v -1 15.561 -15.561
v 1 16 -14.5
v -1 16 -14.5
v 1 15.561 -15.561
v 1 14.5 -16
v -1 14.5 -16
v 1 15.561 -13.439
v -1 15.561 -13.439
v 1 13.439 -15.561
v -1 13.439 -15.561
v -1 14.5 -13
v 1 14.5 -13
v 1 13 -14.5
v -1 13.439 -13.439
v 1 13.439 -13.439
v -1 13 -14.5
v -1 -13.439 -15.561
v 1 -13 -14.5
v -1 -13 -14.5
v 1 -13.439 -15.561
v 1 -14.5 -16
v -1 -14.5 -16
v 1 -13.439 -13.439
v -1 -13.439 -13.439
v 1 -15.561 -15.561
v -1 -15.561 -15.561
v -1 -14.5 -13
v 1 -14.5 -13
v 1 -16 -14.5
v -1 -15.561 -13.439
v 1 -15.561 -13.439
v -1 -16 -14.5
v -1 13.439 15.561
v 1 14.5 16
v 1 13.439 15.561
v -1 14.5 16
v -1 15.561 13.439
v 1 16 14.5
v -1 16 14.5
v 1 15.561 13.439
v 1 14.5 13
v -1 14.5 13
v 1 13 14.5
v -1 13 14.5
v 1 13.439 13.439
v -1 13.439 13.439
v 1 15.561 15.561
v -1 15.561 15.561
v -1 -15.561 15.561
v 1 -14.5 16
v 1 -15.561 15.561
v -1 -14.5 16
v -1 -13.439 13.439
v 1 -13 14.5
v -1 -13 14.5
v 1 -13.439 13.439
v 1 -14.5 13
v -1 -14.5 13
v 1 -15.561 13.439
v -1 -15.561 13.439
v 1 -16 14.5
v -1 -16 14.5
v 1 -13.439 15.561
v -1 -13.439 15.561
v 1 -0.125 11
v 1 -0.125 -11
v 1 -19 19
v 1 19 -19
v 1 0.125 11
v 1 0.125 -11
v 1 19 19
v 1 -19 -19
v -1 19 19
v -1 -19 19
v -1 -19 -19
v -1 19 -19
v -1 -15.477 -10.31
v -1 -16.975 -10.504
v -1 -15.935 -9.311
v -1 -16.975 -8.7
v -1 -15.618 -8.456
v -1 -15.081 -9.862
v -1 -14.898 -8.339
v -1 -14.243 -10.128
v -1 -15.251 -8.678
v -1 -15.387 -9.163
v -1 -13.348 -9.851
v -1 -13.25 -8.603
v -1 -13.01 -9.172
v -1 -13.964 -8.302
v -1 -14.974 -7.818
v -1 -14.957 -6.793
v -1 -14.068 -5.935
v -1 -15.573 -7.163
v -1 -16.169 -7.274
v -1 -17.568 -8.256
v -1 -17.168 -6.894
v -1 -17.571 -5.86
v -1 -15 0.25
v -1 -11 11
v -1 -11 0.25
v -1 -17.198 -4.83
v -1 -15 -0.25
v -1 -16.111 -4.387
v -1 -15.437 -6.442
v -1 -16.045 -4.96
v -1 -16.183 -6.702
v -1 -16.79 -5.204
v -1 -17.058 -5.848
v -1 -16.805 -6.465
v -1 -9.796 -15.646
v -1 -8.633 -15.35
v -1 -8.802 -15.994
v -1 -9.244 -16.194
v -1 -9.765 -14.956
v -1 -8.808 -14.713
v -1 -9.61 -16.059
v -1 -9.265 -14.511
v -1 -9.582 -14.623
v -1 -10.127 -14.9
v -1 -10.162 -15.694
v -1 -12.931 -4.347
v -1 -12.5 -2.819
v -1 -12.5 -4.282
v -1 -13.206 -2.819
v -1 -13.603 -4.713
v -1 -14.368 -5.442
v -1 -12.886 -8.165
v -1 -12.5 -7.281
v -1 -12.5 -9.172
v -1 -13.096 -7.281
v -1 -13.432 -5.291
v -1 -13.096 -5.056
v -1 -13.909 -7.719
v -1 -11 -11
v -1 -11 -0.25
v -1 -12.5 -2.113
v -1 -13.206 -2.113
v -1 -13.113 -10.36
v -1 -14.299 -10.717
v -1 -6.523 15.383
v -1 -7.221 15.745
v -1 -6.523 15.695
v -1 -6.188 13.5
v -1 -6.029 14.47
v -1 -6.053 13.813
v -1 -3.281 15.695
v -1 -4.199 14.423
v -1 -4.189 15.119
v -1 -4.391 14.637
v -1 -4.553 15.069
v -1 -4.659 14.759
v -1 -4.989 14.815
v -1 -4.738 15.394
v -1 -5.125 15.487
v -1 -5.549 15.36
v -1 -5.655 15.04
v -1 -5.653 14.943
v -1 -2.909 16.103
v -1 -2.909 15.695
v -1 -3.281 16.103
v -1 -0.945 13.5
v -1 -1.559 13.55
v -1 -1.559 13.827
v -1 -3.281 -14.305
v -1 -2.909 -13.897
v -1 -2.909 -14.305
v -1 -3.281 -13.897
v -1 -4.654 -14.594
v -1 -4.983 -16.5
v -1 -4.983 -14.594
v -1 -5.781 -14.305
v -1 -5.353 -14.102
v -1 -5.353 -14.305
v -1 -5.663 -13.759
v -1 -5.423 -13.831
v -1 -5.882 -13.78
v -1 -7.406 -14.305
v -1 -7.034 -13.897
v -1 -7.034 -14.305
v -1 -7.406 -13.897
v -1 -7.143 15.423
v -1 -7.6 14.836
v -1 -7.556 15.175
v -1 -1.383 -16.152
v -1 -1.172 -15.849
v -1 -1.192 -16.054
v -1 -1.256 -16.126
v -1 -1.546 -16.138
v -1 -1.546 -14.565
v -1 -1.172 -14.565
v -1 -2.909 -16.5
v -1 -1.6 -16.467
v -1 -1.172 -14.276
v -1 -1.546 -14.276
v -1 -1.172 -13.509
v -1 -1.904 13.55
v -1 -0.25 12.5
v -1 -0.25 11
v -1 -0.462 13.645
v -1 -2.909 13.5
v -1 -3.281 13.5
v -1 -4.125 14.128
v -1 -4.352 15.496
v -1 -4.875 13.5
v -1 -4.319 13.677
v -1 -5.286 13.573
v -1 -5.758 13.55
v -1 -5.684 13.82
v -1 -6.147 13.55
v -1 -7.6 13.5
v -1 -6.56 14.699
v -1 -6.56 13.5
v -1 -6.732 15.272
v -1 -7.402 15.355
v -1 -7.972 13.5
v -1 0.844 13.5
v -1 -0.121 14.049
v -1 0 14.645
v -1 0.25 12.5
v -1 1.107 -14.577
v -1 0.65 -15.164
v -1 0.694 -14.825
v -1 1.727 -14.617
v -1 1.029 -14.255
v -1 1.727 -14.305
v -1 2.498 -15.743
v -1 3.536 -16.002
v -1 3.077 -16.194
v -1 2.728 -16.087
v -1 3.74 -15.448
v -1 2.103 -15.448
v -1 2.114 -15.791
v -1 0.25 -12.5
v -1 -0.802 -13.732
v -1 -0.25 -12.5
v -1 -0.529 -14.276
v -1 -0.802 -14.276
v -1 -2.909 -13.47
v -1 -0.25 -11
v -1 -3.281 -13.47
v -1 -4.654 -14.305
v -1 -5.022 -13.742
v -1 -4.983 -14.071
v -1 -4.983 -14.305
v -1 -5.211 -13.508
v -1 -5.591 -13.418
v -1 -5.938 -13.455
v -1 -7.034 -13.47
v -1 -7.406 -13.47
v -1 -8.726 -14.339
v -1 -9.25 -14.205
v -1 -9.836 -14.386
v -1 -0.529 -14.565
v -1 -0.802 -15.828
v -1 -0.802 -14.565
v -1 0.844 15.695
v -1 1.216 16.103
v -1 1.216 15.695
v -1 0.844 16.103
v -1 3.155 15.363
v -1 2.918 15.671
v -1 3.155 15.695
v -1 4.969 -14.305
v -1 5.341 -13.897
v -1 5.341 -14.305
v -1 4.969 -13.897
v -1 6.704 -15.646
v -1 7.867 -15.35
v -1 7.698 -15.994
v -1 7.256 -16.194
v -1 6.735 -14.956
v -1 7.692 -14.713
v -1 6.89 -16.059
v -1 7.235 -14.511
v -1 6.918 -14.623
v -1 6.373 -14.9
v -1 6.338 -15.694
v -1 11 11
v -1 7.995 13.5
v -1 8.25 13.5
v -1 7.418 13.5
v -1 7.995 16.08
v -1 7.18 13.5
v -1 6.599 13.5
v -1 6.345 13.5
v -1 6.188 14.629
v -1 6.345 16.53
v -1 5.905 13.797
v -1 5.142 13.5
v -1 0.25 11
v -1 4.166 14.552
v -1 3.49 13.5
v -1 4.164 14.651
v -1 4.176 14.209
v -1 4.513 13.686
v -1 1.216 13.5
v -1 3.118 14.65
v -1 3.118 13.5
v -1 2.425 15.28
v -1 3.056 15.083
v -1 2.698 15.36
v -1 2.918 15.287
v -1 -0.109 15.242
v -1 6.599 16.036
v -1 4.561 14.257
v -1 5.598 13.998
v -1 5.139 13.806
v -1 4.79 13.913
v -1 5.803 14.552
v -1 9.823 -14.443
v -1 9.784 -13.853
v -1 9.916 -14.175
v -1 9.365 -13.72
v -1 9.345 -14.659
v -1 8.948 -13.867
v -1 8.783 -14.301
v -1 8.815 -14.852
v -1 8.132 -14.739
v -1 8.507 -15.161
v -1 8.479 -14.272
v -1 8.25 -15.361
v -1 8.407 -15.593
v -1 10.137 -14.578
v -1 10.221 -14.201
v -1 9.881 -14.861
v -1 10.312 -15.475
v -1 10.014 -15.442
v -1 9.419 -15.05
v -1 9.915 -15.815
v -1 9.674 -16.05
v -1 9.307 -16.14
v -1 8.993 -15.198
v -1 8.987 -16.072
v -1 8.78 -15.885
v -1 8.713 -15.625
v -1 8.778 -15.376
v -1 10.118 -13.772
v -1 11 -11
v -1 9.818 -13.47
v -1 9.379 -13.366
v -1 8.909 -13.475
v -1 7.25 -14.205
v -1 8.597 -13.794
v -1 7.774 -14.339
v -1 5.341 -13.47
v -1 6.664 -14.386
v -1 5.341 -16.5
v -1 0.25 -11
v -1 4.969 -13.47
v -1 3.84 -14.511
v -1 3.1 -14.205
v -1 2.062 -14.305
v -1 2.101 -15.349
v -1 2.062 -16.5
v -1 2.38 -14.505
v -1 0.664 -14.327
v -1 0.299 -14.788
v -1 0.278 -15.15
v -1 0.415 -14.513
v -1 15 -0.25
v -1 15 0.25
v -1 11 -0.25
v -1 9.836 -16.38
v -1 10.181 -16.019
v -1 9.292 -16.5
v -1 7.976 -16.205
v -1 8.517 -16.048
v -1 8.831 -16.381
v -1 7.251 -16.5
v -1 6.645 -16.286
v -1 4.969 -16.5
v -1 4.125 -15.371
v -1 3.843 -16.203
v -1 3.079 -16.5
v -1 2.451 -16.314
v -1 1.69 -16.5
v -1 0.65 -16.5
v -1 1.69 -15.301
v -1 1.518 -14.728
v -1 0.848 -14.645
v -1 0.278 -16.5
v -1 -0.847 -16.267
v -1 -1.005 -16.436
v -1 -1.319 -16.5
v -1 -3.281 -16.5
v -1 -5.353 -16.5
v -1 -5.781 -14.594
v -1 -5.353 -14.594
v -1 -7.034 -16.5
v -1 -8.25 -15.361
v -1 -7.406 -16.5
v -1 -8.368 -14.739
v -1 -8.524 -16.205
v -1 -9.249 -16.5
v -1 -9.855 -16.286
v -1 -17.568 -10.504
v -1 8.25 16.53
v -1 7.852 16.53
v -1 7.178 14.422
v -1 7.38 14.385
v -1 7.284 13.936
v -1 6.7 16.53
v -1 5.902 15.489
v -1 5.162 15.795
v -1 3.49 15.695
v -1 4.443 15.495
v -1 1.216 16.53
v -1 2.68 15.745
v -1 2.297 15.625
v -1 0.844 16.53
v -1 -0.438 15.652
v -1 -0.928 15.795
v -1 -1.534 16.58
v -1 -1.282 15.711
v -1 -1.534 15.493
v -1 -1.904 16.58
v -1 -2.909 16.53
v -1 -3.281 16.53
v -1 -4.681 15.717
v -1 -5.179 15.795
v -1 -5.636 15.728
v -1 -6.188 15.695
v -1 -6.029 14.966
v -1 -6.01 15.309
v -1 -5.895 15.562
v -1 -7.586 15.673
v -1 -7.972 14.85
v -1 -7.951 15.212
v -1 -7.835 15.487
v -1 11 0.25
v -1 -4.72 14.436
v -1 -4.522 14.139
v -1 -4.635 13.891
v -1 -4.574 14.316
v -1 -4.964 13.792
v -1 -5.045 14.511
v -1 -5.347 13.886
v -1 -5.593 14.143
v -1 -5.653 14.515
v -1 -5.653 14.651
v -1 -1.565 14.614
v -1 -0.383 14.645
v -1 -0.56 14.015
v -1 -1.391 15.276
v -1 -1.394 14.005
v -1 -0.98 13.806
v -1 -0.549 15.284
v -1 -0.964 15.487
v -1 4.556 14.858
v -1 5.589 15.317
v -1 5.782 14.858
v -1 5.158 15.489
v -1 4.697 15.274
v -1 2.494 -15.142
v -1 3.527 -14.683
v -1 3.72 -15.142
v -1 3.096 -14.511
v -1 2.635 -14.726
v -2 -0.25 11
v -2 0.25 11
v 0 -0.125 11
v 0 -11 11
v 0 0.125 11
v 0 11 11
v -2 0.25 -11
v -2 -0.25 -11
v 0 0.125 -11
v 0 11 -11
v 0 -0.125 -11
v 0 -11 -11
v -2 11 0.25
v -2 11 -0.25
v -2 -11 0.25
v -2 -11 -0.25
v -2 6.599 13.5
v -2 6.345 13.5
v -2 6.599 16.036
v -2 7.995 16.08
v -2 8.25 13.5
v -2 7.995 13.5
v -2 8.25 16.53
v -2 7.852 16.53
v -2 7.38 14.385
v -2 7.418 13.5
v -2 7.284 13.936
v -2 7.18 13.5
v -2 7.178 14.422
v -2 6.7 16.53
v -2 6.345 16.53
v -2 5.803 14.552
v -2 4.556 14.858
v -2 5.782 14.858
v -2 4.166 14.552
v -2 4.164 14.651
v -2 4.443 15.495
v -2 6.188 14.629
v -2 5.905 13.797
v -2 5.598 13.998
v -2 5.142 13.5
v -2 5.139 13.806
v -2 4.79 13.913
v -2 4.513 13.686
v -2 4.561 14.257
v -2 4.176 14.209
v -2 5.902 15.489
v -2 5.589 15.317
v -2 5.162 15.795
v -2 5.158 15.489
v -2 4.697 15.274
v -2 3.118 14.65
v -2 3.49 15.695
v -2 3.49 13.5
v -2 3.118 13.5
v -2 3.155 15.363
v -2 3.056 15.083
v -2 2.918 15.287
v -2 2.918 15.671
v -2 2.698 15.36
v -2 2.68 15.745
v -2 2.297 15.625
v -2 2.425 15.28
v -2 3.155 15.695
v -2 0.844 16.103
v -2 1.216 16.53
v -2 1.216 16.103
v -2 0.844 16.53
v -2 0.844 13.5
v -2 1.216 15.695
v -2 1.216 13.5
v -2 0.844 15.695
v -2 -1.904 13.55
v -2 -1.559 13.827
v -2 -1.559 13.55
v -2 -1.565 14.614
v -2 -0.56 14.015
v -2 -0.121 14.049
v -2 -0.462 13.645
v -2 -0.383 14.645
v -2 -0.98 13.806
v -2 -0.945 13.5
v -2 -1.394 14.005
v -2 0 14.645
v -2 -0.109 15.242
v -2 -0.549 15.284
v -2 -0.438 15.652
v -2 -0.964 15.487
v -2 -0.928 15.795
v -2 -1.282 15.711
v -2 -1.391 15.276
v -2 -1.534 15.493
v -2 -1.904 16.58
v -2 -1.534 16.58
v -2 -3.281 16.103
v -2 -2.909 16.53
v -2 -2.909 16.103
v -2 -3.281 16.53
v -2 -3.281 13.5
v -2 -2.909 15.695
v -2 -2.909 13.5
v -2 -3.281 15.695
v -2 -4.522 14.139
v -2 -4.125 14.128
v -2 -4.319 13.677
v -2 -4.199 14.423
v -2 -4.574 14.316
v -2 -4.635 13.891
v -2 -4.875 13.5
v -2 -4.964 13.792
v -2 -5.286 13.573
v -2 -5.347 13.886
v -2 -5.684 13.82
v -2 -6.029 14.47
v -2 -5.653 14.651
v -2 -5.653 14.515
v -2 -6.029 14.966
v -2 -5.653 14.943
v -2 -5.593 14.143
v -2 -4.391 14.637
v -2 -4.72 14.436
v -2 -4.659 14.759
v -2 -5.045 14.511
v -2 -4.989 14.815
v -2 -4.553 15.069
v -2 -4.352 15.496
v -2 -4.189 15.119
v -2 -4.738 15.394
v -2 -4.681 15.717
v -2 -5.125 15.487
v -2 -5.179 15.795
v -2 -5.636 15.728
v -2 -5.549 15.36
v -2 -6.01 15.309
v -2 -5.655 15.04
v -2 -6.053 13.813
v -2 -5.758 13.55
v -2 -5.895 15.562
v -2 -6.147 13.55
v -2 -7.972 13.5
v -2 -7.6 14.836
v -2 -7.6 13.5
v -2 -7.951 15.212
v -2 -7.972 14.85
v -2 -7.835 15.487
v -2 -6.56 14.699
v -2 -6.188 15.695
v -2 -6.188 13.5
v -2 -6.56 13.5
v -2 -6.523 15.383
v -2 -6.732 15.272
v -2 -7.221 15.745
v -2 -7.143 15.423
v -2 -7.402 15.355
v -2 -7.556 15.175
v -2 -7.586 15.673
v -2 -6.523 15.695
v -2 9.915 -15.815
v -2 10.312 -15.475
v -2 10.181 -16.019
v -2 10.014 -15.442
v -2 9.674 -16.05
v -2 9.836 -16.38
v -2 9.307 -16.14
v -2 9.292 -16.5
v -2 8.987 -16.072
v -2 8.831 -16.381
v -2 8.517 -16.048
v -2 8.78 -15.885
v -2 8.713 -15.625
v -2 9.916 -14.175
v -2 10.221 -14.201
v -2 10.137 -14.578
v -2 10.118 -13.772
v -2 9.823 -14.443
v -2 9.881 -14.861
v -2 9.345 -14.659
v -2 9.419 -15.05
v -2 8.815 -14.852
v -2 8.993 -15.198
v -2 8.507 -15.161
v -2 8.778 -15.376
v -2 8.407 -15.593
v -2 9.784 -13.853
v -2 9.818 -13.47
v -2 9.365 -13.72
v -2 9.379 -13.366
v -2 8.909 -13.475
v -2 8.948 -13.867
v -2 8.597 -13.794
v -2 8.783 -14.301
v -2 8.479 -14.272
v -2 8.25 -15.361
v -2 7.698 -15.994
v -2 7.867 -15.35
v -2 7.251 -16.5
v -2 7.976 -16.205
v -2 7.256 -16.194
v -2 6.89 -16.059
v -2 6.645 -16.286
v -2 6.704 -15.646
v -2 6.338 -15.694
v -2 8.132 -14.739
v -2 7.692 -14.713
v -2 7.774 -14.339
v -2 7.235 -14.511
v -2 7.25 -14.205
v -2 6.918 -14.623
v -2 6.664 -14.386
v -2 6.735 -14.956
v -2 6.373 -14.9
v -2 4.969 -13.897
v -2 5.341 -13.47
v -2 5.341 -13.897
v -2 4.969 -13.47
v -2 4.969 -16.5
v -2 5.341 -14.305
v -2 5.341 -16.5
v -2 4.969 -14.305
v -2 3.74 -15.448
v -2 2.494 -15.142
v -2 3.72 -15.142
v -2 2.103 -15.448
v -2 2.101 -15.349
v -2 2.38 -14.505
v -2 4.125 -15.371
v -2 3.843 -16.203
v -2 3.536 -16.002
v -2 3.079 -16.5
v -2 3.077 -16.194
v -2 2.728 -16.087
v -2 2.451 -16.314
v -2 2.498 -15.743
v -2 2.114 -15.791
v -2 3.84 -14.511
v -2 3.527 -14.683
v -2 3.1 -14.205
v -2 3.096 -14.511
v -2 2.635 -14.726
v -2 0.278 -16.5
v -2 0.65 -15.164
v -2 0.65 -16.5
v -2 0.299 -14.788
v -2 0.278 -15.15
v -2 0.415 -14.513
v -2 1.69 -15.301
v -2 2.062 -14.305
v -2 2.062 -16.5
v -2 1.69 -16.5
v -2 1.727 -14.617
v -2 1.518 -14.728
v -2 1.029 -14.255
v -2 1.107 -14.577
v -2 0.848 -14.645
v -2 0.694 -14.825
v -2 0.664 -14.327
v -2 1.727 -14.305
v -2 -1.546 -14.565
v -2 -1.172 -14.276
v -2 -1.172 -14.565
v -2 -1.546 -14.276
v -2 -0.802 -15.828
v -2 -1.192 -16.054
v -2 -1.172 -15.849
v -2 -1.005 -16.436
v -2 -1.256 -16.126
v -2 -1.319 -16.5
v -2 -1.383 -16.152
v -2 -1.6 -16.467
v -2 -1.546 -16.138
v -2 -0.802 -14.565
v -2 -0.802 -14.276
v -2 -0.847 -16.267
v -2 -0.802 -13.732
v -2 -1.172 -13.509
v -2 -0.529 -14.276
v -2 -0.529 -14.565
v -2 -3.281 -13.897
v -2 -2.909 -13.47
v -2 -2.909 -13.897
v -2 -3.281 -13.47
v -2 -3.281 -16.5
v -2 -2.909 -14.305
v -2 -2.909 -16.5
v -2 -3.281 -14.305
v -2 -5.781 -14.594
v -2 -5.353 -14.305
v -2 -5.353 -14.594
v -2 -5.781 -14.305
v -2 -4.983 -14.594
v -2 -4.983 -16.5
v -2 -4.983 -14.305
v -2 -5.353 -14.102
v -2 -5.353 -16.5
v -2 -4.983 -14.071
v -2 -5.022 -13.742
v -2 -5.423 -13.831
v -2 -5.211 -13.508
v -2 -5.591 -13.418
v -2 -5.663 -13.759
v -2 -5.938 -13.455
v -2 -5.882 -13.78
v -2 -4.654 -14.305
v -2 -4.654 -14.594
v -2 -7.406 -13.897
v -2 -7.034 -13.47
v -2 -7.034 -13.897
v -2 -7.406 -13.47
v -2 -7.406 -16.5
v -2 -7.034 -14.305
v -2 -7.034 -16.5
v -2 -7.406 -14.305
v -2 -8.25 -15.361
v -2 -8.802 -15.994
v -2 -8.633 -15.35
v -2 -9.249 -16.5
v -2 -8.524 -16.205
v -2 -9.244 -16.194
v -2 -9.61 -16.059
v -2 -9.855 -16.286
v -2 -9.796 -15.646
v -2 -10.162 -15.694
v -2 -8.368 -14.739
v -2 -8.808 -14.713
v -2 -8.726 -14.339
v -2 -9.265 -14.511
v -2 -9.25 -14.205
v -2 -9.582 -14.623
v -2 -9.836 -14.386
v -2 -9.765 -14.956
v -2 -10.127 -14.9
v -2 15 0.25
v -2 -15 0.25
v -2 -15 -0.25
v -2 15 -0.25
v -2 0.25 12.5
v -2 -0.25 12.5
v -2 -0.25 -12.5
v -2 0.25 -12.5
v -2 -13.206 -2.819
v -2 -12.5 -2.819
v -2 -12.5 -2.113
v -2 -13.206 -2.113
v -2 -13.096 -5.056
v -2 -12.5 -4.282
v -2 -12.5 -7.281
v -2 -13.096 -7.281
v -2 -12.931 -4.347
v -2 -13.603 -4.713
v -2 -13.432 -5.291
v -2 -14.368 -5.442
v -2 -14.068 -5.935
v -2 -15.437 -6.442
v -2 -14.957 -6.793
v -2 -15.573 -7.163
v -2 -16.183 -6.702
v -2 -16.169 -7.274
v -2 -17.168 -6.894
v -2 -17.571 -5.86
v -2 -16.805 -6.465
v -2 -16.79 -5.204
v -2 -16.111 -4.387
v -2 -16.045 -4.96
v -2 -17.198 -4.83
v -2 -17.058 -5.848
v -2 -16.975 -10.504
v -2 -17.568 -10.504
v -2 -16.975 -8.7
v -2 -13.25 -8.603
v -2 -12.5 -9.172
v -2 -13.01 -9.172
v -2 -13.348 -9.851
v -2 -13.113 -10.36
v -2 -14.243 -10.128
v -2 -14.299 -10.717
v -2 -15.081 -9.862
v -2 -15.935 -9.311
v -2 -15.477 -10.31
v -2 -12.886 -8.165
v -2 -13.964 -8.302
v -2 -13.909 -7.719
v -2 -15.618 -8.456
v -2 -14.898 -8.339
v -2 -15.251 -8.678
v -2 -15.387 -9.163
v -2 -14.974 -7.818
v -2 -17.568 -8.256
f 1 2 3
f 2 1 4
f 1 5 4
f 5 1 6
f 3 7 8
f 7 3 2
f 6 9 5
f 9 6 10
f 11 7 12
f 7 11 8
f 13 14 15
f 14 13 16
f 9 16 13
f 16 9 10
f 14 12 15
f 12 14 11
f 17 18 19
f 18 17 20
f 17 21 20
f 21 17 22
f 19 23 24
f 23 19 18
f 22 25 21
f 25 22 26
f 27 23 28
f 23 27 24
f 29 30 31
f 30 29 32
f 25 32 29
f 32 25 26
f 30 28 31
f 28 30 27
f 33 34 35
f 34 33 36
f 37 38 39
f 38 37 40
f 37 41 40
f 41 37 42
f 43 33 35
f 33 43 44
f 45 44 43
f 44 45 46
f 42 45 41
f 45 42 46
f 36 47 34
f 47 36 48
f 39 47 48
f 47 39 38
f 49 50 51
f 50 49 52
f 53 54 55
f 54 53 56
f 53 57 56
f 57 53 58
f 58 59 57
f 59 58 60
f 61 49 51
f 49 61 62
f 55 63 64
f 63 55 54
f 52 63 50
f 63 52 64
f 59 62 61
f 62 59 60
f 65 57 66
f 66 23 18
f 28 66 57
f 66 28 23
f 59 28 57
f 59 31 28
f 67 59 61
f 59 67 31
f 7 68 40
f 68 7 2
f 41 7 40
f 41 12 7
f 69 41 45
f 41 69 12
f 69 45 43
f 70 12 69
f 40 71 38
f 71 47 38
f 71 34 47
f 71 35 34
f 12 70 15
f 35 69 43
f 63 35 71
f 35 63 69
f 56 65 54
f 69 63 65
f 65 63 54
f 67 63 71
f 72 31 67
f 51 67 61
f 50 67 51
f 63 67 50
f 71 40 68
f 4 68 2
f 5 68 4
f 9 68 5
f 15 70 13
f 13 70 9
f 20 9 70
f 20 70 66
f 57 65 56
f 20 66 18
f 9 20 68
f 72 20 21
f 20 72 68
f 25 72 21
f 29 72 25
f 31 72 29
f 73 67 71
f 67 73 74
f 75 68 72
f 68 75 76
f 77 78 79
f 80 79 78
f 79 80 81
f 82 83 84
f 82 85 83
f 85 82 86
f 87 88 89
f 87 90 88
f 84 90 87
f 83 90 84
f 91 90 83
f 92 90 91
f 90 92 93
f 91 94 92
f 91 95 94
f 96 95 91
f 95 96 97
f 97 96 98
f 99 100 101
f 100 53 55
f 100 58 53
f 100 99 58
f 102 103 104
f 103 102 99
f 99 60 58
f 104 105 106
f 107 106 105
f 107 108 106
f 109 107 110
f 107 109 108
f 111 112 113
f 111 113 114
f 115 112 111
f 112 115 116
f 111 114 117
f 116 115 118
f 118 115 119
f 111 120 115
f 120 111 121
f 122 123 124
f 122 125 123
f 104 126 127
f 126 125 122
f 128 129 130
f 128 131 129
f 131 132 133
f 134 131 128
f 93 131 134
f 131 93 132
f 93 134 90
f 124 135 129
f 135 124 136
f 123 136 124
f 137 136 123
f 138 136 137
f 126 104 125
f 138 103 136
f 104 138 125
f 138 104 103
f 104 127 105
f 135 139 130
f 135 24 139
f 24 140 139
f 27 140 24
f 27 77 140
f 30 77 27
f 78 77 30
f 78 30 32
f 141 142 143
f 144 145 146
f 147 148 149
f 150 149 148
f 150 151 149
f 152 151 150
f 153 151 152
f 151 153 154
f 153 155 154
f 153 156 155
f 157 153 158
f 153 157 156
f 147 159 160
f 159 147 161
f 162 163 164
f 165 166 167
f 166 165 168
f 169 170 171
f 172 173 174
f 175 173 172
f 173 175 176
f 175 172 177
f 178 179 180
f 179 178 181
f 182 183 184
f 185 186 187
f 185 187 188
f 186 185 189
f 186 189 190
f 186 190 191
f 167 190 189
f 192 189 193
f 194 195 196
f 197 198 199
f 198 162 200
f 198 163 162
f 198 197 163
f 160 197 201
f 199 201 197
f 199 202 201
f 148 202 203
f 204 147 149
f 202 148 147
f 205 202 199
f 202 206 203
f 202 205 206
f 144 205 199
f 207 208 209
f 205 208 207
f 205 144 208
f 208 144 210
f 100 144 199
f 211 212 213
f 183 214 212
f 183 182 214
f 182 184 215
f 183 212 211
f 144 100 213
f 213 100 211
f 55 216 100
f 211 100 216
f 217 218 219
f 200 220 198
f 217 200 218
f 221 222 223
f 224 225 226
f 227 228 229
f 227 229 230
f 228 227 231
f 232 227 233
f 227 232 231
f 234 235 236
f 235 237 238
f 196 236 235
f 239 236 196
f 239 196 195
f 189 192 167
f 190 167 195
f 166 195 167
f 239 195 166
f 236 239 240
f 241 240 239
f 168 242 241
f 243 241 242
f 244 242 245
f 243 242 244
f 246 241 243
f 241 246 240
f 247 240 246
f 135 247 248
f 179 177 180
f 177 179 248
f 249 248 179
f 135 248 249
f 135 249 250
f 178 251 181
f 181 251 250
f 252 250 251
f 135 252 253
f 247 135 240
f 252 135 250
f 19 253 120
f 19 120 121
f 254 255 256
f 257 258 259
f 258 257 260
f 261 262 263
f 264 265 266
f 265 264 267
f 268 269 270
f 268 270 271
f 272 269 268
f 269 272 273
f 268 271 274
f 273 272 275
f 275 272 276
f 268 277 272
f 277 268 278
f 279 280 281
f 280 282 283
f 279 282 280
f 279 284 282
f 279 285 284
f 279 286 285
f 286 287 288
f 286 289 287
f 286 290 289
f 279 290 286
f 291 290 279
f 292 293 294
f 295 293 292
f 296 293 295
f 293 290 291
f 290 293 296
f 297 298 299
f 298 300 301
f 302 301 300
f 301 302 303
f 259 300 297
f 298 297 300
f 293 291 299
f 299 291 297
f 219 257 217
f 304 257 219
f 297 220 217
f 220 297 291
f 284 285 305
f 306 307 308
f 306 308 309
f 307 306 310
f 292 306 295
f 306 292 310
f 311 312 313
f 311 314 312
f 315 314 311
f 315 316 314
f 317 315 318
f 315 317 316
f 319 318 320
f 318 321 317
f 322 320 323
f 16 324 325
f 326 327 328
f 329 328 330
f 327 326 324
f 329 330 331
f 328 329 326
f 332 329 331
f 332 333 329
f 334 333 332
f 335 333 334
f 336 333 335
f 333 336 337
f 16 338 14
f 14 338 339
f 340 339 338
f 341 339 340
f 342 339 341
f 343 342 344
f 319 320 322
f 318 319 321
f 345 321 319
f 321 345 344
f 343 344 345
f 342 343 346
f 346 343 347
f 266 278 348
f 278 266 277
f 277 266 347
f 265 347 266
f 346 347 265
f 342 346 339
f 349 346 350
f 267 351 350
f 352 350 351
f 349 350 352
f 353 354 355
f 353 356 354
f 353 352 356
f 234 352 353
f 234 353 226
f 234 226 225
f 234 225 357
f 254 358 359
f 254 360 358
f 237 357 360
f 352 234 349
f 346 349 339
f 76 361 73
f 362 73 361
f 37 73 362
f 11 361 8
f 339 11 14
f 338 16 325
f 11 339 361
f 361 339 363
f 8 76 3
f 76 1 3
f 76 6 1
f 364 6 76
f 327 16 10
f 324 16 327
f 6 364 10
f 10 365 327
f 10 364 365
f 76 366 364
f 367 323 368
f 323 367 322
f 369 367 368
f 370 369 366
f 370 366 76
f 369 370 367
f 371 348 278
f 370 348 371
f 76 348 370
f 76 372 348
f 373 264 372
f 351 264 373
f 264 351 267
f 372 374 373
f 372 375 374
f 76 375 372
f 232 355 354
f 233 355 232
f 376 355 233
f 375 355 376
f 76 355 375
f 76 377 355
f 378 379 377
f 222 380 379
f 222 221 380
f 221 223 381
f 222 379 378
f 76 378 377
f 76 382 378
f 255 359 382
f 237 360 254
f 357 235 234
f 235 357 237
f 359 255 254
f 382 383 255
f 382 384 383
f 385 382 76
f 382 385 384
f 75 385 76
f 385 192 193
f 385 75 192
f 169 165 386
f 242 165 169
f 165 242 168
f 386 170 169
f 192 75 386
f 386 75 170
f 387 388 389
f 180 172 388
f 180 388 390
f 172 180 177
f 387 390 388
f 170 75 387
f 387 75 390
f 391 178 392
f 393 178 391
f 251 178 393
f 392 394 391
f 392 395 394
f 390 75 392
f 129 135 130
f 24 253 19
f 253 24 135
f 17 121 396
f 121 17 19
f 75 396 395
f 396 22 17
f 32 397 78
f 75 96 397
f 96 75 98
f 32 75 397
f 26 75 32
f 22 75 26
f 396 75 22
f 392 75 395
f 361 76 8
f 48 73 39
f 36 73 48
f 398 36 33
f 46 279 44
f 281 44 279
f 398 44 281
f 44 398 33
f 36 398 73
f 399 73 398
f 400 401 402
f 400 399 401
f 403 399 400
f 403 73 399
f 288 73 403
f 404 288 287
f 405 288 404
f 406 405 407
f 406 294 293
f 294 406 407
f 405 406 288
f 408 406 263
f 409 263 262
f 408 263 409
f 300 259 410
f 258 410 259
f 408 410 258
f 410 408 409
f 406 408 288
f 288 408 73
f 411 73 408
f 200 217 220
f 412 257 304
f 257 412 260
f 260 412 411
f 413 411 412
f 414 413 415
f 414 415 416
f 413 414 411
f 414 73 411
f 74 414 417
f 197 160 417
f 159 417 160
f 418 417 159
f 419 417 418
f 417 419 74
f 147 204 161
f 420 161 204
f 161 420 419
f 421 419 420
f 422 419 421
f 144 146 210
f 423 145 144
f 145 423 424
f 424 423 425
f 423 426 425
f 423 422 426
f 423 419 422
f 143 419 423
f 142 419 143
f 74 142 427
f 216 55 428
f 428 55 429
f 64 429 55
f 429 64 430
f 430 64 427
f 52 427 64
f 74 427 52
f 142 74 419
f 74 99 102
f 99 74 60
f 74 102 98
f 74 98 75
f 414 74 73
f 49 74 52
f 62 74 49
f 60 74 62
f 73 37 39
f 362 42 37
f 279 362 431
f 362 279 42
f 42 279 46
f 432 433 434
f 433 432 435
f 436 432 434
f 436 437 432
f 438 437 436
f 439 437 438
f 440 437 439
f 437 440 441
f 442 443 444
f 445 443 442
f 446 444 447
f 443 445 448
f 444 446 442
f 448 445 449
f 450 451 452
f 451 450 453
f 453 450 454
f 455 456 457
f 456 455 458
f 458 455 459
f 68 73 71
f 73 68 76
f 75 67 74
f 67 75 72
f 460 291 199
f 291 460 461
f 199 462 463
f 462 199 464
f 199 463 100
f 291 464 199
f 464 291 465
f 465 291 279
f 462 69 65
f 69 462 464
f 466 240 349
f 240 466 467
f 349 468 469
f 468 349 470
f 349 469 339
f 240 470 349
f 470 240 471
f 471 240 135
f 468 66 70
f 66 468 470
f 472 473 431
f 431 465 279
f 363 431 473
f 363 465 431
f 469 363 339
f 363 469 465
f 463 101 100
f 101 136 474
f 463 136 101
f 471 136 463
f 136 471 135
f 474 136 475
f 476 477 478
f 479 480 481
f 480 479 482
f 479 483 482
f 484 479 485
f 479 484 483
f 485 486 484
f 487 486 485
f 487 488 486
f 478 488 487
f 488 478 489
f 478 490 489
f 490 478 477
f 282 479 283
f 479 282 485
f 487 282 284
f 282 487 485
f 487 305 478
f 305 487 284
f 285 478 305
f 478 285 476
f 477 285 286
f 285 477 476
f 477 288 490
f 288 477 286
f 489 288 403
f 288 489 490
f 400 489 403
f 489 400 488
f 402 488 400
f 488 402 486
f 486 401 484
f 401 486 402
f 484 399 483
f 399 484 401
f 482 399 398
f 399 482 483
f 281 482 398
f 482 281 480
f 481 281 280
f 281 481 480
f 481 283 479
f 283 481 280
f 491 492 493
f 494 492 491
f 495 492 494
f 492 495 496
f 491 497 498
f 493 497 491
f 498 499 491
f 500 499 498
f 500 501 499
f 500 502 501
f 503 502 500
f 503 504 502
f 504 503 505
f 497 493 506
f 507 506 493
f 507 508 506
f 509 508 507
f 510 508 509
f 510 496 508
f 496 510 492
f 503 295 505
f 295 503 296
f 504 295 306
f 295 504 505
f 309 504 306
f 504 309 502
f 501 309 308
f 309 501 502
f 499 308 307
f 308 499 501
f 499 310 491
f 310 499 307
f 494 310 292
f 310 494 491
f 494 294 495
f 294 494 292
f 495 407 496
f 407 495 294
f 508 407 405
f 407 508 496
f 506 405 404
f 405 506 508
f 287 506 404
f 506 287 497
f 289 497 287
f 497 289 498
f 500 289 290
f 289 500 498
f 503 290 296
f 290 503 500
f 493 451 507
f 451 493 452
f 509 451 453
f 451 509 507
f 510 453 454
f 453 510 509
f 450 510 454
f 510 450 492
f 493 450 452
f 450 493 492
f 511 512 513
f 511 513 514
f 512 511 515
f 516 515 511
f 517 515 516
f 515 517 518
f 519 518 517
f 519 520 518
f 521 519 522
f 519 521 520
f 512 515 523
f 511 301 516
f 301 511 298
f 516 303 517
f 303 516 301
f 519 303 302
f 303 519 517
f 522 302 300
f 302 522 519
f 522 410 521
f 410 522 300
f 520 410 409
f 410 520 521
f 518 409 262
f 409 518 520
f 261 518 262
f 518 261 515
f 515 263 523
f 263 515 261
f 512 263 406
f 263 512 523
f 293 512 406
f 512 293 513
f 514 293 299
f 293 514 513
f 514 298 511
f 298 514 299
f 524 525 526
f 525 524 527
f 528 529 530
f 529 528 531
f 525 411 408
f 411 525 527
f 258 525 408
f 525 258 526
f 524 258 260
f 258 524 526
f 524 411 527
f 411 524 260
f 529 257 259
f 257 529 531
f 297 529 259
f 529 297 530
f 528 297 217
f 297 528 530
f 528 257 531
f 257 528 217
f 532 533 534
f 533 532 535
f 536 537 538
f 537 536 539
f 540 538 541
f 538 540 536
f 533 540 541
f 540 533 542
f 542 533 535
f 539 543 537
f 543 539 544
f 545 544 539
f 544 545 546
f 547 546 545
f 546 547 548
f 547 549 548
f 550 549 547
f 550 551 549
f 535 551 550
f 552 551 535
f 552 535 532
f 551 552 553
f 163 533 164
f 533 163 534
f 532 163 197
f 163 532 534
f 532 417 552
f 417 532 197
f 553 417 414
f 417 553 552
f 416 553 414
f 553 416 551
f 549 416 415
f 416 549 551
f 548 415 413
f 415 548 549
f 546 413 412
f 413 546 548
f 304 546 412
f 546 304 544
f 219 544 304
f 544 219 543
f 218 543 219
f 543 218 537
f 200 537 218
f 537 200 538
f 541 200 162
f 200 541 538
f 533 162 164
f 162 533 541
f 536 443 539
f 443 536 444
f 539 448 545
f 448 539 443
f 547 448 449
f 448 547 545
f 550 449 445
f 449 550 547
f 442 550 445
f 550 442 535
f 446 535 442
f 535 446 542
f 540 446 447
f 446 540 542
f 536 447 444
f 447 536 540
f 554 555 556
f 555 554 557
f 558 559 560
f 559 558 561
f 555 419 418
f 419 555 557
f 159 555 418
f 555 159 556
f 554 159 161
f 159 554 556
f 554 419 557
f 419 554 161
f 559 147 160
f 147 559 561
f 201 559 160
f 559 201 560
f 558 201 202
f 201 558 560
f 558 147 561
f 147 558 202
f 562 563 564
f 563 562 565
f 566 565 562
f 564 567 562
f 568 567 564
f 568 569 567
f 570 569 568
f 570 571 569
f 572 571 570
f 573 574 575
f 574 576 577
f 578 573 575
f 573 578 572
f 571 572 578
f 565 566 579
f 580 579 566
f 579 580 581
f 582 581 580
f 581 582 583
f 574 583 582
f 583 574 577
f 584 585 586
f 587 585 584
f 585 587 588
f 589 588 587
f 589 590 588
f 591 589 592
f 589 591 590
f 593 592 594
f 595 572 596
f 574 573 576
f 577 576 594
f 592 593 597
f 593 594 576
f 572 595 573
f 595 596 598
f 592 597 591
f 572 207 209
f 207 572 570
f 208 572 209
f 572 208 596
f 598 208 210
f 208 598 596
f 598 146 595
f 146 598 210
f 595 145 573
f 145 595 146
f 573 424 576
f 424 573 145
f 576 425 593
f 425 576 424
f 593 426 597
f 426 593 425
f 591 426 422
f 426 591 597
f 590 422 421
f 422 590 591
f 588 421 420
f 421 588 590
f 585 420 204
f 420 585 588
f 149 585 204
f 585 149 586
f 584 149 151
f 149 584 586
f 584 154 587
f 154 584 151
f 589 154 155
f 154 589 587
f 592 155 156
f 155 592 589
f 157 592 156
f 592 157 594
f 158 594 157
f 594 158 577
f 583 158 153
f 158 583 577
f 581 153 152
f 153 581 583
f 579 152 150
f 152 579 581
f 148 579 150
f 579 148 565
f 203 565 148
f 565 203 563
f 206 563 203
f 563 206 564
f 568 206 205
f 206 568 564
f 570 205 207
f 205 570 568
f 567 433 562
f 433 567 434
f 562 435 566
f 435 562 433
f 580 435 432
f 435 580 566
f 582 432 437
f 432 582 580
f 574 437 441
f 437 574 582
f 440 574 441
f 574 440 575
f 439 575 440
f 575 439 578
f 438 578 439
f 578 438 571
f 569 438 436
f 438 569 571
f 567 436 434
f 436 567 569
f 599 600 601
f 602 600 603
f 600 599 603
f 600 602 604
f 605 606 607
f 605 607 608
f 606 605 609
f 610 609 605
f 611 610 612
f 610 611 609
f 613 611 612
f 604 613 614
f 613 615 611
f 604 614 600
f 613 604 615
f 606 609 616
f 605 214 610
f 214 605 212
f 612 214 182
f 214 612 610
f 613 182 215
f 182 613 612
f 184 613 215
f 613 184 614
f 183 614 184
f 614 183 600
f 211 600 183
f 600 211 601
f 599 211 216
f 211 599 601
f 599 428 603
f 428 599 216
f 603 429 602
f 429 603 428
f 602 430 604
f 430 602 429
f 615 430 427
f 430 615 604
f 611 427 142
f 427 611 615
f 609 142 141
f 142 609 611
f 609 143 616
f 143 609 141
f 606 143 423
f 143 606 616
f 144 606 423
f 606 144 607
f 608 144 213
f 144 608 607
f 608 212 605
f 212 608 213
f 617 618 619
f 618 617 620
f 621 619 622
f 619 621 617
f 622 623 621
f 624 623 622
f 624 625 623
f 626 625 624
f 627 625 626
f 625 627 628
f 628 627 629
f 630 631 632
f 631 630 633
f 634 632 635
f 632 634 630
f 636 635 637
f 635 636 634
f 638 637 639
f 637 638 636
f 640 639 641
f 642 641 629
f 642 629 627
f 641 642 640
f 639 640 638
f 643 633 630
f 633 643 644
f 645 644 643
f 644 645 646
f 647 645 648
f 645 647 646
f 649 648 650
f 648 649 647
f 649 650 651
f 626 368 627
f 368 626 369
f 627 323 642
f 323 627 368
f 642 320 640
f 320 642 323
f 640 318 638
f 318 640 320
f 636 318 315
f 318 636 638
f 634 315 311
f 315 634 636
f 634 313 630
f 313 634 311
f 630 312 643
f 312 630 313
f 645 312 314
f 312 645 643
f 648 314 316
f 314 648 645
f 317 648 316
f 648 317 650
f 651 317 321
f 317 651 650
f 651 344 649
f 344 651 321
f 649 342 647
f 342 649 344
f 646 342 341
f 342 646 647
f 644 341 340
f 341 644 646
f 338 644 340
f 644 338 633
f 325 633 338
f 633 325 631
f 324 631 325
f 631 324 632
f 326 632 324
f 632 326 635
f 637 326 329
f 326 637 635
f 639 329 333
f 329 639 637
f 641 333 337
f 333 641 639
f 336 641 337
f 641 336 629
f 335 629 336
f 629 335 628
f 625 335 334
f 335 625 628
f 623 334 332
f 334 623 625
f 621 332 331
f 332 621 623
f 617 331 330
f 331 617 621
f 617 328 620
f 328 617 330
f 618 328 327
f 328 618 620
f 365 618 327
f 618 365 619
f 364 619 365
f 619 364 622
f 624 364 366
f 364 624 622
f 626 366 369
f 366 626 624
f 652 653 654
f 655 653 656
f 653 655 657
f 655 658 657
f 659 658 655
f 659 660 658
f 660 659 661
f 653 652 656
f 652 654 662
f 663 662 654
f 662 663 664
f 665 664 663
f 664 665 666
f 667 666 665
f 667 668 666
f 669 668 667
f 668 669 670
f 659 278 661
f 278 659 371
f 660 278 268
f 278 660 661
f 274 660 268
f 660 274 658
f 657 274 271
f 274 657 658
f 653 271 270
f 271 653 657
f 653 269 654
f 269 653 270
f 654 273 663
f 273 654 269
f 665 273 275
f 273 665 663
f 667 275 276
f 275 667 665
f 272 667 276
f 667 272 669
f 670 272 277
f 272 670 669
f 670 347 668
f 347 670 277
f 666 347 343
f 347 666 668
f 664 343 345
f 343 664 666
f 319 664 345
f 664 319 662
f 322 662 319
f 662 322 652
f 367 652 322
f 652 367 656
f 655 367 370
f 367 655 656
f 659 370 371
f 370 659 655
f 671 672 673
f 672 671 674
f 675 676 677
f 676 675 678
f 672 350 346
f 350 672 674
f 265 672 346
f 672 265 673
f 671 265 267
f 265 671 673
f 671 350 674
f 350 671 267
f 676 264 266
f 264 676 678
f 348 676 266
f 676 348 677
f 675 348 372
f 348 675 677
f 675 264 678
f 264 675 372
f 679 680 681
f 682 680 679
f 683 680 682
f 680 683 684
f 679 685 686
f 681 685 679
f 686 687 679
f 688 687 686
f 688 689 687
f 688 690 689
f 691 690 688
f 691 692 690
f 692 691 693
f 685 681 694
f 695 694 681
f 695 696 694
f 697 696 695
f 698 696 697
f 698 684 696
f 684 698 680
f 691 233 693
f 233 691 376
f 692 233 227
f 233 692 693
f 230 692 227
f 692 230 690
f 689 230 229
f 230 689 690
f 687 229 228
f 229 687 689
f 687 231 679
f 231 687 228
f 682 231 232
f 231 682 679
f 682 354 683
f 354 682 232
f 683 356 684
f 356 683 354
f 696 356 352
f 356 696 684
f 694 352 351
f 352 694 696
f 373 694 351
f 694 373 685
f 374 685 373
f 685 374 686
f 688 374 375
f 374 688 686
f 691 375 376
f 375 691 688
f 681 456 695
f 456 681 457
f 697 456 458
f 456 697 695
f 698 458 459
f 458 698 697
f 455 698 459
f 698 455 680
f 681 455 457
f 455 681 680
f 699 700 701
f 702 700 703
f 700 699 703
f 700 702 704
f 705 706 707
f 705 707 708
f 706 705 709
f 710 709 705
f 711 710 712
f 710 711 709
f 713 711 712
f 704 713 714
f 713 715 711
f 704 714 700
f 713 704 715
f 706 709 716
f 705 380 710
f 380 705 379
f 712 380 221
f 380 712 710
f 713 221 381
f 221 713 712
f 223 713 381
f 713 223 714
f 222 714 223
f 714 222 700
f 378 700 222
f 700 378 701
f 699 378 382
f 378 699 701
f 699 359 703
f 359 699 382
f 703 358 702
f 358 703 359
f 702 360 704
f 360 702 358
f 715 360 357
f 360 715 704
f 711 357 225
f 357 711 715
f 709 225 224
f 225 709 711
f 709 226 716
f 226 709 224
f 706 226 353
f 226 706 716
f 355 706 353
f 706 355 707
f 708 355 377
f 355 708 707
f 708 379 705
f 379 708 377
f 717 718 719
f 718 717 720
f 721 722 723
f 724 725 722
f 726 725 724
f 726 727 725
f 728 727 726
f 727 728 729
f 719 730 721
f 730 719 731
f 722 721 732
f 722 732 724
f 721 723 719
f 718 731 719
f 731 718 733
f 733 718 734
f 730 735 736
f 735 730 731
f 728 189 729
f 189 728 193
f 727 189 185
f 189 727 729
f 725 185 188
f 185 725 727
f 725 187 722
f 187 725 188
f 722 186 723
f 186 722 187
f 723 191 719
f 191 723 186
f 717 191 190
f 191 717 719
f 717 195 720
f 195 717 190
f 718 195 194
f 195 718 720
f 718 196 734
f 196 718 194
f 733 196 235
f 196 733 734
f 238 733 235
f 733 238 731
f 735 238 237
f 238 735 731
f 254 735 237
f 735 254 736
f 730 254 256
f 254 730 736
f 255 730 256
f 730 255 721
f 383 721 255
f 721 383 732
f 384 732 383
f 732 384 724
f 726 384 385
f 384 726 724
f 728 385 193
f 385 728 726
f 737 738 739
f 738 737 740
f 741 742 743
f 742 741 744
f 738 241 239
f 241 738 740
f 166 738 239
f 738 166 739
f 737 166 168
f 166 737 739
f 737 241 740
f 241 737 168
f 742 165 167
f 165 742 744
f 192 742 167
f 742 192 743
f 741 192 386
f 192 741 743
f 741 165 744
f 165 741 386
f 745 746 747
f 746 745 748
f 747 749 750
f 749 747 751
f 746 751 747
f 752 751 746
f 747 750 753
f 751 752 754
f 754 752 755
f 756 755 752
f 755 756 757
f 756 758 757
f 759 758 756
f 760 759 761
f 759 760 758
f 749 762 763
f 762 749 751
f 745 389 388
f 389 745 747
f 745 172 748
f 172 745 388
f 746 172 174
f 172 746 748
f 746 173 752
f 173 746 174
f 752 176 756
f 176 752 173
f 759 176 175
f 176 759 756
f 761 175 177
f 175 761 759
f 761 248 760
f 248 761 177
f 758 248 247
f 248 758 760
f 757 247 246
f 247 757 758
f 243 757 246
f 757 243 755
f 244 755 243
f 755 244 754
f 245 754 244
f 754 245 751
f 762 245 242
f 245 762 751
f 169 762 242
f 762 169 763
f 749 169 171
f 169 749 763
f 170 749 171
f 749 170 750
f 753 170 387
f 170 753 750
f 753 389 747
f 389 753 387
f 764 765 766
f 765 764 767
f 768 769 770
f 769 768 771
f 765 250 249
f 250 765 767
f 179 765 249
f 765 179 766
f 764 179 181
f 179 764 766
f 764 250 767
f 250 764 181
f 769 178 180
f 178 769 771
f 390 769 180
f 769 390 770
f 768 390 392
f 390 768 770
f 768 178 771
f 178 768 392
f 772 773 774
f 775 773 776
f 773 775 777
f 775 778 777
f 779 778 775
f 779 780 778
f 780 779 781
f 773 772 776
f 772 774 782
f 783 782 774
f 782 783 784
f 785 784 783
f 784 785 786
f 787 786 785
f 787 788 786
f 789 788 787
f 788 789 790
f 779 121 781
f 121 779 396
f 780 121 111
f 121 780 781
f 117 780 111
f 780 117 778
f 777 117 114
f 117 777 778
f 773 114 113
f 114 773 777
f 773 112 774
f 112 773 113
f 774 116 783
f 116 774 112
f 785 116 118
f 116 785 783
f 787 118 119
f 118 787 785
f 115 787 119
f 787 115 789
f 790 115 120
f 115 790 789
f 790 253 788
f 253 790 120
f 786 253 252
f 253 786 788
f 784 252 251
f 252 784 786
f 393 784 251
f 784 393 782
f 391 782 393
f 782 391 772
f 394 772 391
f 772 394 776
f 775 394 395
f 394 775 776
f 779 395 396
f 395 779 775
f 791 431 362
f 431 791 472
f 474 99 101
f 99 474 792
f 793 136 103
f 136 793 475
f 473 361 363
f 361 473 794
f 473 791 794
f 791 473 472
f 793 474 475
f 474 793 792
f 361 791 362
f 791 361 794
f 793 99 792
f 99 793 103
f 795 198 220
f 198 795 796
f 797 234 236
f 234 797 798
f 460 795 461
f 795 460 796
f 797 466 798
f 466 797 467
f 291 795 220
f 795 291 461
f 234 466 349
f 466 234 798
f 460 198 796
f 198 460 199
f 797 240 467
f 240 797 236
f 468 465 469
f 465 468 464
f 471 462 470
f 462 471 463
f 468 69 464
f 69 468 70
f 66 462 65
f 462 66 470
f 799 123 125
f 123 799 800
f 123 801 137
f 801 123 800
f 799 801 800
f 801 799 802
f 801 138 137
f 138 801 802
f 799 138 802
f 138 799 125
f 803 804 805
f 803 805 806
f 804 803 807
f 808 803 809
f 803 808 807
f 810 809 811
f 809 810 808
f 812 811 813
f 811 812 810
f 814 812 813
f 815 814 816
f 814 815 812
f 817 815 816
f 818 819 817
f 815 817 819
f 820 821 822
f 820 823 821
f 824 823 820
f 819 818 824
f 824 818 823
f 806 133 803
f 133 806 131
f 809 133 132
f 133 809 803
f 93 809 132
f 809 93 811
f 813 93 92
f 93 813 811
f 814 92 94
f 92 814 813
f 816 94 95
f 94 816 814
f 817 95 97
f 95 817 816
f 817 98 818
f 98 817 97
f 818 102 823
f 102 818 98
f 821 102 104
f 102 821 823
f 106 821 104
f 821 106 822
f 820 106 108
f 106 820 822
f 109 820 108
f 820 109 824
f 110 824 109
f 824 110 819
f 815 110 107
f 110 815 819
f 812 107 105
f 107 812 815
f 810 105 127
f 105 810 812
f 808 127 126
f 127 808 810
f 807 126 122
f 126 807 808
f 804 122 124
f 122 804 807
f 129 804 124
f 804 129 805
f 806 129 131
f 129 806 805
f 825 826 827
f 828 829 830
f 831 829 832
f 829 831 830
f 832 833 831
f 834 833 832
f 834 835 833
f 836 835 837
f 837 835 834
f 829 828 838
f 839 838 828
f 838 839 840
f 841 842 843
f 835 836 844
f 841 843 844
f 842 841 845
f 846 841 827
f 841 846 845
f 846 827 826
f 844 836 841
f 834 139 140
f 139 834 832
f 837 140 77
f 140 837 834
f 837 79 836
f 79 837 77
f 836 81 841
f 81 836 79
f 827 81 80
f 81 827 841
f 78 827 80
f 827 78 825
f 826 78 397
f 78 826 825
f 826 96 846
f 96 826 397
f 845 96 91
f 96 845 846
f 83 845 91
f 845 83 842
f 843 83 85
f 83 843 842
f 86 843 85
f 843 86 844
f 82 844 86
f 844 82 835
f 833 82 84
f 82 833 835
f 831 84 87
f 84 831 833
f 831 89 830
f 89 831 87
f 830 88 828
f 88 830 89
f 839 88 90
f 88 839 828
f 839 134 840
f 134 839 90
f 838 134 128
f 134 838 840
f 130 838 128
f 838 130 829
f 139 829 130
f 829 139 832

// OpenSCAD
// file: opticsMount_retainingBracket.scad
use <write.scad>

module retainingBracket(){
	difference(){	
		translate([0,0,0]) color([.7,.9,.2]) cube(size=[2,38,38],center=true);
		translate([0,0,0]) cube(size=[6,22,22],center=true);
		rotate([0,90,0]){
			translate([14.5,14.5,0]) cylinder(h=5,r=1.5,$fn=8,center=true);			
			translate([14.5,-14.5,0]) cylinder(h=5,r=1.5,$fn=8,center=true);			
			translate([-14.5,14.5,0]) cylinder(h=5,r=1.5,$fn=8,center=true);			
			translate([-14.5,-14.5,0]) cylinder(h=5,r=1.5,$fn=8,center=true);		
		}
	}
	rotate([90,0,-90]){
		translate([0,15,1]){
			write("Meridian",h=3,t=2,center=true);
		}
	}
	rotate([90,0,-90]){
		translate([0,-15,1]){
			write("Scientific",h=3,t=2,center=true);
		}
	}
	difference(){
		translate([-1,0,0]) cube(size=[2,30,.5],center=true);	
		translate([0,0,0]) cube(size=[6,22,22],center=true);
	}
	difference(){
		translate([-1,0,0]) cube(size=[2,.5,25],center=true);	
		translate([0,0,0]) cube(size=[6,22,22],center=true);
	}
}

retainingBracket();
// main file
use <write.scad>
use <opticsMount_retainingBracket.scad>

module aperture(){
	difference(){
		translate([.5,0,0]) color([0.3,0.5,0.9]) cube(size=[1,22,22],center=true);
		translate([.5,0,0]) cube(size=[2,.25,22],center=true);
	}
	rotate([90,90,-90]){
		translate([6,15,1]){
			write(".25",h=5,t=2,center=true);
		}
	}
}

translate([0,0,0]){
	retainingBracket();
	aperture();
}
